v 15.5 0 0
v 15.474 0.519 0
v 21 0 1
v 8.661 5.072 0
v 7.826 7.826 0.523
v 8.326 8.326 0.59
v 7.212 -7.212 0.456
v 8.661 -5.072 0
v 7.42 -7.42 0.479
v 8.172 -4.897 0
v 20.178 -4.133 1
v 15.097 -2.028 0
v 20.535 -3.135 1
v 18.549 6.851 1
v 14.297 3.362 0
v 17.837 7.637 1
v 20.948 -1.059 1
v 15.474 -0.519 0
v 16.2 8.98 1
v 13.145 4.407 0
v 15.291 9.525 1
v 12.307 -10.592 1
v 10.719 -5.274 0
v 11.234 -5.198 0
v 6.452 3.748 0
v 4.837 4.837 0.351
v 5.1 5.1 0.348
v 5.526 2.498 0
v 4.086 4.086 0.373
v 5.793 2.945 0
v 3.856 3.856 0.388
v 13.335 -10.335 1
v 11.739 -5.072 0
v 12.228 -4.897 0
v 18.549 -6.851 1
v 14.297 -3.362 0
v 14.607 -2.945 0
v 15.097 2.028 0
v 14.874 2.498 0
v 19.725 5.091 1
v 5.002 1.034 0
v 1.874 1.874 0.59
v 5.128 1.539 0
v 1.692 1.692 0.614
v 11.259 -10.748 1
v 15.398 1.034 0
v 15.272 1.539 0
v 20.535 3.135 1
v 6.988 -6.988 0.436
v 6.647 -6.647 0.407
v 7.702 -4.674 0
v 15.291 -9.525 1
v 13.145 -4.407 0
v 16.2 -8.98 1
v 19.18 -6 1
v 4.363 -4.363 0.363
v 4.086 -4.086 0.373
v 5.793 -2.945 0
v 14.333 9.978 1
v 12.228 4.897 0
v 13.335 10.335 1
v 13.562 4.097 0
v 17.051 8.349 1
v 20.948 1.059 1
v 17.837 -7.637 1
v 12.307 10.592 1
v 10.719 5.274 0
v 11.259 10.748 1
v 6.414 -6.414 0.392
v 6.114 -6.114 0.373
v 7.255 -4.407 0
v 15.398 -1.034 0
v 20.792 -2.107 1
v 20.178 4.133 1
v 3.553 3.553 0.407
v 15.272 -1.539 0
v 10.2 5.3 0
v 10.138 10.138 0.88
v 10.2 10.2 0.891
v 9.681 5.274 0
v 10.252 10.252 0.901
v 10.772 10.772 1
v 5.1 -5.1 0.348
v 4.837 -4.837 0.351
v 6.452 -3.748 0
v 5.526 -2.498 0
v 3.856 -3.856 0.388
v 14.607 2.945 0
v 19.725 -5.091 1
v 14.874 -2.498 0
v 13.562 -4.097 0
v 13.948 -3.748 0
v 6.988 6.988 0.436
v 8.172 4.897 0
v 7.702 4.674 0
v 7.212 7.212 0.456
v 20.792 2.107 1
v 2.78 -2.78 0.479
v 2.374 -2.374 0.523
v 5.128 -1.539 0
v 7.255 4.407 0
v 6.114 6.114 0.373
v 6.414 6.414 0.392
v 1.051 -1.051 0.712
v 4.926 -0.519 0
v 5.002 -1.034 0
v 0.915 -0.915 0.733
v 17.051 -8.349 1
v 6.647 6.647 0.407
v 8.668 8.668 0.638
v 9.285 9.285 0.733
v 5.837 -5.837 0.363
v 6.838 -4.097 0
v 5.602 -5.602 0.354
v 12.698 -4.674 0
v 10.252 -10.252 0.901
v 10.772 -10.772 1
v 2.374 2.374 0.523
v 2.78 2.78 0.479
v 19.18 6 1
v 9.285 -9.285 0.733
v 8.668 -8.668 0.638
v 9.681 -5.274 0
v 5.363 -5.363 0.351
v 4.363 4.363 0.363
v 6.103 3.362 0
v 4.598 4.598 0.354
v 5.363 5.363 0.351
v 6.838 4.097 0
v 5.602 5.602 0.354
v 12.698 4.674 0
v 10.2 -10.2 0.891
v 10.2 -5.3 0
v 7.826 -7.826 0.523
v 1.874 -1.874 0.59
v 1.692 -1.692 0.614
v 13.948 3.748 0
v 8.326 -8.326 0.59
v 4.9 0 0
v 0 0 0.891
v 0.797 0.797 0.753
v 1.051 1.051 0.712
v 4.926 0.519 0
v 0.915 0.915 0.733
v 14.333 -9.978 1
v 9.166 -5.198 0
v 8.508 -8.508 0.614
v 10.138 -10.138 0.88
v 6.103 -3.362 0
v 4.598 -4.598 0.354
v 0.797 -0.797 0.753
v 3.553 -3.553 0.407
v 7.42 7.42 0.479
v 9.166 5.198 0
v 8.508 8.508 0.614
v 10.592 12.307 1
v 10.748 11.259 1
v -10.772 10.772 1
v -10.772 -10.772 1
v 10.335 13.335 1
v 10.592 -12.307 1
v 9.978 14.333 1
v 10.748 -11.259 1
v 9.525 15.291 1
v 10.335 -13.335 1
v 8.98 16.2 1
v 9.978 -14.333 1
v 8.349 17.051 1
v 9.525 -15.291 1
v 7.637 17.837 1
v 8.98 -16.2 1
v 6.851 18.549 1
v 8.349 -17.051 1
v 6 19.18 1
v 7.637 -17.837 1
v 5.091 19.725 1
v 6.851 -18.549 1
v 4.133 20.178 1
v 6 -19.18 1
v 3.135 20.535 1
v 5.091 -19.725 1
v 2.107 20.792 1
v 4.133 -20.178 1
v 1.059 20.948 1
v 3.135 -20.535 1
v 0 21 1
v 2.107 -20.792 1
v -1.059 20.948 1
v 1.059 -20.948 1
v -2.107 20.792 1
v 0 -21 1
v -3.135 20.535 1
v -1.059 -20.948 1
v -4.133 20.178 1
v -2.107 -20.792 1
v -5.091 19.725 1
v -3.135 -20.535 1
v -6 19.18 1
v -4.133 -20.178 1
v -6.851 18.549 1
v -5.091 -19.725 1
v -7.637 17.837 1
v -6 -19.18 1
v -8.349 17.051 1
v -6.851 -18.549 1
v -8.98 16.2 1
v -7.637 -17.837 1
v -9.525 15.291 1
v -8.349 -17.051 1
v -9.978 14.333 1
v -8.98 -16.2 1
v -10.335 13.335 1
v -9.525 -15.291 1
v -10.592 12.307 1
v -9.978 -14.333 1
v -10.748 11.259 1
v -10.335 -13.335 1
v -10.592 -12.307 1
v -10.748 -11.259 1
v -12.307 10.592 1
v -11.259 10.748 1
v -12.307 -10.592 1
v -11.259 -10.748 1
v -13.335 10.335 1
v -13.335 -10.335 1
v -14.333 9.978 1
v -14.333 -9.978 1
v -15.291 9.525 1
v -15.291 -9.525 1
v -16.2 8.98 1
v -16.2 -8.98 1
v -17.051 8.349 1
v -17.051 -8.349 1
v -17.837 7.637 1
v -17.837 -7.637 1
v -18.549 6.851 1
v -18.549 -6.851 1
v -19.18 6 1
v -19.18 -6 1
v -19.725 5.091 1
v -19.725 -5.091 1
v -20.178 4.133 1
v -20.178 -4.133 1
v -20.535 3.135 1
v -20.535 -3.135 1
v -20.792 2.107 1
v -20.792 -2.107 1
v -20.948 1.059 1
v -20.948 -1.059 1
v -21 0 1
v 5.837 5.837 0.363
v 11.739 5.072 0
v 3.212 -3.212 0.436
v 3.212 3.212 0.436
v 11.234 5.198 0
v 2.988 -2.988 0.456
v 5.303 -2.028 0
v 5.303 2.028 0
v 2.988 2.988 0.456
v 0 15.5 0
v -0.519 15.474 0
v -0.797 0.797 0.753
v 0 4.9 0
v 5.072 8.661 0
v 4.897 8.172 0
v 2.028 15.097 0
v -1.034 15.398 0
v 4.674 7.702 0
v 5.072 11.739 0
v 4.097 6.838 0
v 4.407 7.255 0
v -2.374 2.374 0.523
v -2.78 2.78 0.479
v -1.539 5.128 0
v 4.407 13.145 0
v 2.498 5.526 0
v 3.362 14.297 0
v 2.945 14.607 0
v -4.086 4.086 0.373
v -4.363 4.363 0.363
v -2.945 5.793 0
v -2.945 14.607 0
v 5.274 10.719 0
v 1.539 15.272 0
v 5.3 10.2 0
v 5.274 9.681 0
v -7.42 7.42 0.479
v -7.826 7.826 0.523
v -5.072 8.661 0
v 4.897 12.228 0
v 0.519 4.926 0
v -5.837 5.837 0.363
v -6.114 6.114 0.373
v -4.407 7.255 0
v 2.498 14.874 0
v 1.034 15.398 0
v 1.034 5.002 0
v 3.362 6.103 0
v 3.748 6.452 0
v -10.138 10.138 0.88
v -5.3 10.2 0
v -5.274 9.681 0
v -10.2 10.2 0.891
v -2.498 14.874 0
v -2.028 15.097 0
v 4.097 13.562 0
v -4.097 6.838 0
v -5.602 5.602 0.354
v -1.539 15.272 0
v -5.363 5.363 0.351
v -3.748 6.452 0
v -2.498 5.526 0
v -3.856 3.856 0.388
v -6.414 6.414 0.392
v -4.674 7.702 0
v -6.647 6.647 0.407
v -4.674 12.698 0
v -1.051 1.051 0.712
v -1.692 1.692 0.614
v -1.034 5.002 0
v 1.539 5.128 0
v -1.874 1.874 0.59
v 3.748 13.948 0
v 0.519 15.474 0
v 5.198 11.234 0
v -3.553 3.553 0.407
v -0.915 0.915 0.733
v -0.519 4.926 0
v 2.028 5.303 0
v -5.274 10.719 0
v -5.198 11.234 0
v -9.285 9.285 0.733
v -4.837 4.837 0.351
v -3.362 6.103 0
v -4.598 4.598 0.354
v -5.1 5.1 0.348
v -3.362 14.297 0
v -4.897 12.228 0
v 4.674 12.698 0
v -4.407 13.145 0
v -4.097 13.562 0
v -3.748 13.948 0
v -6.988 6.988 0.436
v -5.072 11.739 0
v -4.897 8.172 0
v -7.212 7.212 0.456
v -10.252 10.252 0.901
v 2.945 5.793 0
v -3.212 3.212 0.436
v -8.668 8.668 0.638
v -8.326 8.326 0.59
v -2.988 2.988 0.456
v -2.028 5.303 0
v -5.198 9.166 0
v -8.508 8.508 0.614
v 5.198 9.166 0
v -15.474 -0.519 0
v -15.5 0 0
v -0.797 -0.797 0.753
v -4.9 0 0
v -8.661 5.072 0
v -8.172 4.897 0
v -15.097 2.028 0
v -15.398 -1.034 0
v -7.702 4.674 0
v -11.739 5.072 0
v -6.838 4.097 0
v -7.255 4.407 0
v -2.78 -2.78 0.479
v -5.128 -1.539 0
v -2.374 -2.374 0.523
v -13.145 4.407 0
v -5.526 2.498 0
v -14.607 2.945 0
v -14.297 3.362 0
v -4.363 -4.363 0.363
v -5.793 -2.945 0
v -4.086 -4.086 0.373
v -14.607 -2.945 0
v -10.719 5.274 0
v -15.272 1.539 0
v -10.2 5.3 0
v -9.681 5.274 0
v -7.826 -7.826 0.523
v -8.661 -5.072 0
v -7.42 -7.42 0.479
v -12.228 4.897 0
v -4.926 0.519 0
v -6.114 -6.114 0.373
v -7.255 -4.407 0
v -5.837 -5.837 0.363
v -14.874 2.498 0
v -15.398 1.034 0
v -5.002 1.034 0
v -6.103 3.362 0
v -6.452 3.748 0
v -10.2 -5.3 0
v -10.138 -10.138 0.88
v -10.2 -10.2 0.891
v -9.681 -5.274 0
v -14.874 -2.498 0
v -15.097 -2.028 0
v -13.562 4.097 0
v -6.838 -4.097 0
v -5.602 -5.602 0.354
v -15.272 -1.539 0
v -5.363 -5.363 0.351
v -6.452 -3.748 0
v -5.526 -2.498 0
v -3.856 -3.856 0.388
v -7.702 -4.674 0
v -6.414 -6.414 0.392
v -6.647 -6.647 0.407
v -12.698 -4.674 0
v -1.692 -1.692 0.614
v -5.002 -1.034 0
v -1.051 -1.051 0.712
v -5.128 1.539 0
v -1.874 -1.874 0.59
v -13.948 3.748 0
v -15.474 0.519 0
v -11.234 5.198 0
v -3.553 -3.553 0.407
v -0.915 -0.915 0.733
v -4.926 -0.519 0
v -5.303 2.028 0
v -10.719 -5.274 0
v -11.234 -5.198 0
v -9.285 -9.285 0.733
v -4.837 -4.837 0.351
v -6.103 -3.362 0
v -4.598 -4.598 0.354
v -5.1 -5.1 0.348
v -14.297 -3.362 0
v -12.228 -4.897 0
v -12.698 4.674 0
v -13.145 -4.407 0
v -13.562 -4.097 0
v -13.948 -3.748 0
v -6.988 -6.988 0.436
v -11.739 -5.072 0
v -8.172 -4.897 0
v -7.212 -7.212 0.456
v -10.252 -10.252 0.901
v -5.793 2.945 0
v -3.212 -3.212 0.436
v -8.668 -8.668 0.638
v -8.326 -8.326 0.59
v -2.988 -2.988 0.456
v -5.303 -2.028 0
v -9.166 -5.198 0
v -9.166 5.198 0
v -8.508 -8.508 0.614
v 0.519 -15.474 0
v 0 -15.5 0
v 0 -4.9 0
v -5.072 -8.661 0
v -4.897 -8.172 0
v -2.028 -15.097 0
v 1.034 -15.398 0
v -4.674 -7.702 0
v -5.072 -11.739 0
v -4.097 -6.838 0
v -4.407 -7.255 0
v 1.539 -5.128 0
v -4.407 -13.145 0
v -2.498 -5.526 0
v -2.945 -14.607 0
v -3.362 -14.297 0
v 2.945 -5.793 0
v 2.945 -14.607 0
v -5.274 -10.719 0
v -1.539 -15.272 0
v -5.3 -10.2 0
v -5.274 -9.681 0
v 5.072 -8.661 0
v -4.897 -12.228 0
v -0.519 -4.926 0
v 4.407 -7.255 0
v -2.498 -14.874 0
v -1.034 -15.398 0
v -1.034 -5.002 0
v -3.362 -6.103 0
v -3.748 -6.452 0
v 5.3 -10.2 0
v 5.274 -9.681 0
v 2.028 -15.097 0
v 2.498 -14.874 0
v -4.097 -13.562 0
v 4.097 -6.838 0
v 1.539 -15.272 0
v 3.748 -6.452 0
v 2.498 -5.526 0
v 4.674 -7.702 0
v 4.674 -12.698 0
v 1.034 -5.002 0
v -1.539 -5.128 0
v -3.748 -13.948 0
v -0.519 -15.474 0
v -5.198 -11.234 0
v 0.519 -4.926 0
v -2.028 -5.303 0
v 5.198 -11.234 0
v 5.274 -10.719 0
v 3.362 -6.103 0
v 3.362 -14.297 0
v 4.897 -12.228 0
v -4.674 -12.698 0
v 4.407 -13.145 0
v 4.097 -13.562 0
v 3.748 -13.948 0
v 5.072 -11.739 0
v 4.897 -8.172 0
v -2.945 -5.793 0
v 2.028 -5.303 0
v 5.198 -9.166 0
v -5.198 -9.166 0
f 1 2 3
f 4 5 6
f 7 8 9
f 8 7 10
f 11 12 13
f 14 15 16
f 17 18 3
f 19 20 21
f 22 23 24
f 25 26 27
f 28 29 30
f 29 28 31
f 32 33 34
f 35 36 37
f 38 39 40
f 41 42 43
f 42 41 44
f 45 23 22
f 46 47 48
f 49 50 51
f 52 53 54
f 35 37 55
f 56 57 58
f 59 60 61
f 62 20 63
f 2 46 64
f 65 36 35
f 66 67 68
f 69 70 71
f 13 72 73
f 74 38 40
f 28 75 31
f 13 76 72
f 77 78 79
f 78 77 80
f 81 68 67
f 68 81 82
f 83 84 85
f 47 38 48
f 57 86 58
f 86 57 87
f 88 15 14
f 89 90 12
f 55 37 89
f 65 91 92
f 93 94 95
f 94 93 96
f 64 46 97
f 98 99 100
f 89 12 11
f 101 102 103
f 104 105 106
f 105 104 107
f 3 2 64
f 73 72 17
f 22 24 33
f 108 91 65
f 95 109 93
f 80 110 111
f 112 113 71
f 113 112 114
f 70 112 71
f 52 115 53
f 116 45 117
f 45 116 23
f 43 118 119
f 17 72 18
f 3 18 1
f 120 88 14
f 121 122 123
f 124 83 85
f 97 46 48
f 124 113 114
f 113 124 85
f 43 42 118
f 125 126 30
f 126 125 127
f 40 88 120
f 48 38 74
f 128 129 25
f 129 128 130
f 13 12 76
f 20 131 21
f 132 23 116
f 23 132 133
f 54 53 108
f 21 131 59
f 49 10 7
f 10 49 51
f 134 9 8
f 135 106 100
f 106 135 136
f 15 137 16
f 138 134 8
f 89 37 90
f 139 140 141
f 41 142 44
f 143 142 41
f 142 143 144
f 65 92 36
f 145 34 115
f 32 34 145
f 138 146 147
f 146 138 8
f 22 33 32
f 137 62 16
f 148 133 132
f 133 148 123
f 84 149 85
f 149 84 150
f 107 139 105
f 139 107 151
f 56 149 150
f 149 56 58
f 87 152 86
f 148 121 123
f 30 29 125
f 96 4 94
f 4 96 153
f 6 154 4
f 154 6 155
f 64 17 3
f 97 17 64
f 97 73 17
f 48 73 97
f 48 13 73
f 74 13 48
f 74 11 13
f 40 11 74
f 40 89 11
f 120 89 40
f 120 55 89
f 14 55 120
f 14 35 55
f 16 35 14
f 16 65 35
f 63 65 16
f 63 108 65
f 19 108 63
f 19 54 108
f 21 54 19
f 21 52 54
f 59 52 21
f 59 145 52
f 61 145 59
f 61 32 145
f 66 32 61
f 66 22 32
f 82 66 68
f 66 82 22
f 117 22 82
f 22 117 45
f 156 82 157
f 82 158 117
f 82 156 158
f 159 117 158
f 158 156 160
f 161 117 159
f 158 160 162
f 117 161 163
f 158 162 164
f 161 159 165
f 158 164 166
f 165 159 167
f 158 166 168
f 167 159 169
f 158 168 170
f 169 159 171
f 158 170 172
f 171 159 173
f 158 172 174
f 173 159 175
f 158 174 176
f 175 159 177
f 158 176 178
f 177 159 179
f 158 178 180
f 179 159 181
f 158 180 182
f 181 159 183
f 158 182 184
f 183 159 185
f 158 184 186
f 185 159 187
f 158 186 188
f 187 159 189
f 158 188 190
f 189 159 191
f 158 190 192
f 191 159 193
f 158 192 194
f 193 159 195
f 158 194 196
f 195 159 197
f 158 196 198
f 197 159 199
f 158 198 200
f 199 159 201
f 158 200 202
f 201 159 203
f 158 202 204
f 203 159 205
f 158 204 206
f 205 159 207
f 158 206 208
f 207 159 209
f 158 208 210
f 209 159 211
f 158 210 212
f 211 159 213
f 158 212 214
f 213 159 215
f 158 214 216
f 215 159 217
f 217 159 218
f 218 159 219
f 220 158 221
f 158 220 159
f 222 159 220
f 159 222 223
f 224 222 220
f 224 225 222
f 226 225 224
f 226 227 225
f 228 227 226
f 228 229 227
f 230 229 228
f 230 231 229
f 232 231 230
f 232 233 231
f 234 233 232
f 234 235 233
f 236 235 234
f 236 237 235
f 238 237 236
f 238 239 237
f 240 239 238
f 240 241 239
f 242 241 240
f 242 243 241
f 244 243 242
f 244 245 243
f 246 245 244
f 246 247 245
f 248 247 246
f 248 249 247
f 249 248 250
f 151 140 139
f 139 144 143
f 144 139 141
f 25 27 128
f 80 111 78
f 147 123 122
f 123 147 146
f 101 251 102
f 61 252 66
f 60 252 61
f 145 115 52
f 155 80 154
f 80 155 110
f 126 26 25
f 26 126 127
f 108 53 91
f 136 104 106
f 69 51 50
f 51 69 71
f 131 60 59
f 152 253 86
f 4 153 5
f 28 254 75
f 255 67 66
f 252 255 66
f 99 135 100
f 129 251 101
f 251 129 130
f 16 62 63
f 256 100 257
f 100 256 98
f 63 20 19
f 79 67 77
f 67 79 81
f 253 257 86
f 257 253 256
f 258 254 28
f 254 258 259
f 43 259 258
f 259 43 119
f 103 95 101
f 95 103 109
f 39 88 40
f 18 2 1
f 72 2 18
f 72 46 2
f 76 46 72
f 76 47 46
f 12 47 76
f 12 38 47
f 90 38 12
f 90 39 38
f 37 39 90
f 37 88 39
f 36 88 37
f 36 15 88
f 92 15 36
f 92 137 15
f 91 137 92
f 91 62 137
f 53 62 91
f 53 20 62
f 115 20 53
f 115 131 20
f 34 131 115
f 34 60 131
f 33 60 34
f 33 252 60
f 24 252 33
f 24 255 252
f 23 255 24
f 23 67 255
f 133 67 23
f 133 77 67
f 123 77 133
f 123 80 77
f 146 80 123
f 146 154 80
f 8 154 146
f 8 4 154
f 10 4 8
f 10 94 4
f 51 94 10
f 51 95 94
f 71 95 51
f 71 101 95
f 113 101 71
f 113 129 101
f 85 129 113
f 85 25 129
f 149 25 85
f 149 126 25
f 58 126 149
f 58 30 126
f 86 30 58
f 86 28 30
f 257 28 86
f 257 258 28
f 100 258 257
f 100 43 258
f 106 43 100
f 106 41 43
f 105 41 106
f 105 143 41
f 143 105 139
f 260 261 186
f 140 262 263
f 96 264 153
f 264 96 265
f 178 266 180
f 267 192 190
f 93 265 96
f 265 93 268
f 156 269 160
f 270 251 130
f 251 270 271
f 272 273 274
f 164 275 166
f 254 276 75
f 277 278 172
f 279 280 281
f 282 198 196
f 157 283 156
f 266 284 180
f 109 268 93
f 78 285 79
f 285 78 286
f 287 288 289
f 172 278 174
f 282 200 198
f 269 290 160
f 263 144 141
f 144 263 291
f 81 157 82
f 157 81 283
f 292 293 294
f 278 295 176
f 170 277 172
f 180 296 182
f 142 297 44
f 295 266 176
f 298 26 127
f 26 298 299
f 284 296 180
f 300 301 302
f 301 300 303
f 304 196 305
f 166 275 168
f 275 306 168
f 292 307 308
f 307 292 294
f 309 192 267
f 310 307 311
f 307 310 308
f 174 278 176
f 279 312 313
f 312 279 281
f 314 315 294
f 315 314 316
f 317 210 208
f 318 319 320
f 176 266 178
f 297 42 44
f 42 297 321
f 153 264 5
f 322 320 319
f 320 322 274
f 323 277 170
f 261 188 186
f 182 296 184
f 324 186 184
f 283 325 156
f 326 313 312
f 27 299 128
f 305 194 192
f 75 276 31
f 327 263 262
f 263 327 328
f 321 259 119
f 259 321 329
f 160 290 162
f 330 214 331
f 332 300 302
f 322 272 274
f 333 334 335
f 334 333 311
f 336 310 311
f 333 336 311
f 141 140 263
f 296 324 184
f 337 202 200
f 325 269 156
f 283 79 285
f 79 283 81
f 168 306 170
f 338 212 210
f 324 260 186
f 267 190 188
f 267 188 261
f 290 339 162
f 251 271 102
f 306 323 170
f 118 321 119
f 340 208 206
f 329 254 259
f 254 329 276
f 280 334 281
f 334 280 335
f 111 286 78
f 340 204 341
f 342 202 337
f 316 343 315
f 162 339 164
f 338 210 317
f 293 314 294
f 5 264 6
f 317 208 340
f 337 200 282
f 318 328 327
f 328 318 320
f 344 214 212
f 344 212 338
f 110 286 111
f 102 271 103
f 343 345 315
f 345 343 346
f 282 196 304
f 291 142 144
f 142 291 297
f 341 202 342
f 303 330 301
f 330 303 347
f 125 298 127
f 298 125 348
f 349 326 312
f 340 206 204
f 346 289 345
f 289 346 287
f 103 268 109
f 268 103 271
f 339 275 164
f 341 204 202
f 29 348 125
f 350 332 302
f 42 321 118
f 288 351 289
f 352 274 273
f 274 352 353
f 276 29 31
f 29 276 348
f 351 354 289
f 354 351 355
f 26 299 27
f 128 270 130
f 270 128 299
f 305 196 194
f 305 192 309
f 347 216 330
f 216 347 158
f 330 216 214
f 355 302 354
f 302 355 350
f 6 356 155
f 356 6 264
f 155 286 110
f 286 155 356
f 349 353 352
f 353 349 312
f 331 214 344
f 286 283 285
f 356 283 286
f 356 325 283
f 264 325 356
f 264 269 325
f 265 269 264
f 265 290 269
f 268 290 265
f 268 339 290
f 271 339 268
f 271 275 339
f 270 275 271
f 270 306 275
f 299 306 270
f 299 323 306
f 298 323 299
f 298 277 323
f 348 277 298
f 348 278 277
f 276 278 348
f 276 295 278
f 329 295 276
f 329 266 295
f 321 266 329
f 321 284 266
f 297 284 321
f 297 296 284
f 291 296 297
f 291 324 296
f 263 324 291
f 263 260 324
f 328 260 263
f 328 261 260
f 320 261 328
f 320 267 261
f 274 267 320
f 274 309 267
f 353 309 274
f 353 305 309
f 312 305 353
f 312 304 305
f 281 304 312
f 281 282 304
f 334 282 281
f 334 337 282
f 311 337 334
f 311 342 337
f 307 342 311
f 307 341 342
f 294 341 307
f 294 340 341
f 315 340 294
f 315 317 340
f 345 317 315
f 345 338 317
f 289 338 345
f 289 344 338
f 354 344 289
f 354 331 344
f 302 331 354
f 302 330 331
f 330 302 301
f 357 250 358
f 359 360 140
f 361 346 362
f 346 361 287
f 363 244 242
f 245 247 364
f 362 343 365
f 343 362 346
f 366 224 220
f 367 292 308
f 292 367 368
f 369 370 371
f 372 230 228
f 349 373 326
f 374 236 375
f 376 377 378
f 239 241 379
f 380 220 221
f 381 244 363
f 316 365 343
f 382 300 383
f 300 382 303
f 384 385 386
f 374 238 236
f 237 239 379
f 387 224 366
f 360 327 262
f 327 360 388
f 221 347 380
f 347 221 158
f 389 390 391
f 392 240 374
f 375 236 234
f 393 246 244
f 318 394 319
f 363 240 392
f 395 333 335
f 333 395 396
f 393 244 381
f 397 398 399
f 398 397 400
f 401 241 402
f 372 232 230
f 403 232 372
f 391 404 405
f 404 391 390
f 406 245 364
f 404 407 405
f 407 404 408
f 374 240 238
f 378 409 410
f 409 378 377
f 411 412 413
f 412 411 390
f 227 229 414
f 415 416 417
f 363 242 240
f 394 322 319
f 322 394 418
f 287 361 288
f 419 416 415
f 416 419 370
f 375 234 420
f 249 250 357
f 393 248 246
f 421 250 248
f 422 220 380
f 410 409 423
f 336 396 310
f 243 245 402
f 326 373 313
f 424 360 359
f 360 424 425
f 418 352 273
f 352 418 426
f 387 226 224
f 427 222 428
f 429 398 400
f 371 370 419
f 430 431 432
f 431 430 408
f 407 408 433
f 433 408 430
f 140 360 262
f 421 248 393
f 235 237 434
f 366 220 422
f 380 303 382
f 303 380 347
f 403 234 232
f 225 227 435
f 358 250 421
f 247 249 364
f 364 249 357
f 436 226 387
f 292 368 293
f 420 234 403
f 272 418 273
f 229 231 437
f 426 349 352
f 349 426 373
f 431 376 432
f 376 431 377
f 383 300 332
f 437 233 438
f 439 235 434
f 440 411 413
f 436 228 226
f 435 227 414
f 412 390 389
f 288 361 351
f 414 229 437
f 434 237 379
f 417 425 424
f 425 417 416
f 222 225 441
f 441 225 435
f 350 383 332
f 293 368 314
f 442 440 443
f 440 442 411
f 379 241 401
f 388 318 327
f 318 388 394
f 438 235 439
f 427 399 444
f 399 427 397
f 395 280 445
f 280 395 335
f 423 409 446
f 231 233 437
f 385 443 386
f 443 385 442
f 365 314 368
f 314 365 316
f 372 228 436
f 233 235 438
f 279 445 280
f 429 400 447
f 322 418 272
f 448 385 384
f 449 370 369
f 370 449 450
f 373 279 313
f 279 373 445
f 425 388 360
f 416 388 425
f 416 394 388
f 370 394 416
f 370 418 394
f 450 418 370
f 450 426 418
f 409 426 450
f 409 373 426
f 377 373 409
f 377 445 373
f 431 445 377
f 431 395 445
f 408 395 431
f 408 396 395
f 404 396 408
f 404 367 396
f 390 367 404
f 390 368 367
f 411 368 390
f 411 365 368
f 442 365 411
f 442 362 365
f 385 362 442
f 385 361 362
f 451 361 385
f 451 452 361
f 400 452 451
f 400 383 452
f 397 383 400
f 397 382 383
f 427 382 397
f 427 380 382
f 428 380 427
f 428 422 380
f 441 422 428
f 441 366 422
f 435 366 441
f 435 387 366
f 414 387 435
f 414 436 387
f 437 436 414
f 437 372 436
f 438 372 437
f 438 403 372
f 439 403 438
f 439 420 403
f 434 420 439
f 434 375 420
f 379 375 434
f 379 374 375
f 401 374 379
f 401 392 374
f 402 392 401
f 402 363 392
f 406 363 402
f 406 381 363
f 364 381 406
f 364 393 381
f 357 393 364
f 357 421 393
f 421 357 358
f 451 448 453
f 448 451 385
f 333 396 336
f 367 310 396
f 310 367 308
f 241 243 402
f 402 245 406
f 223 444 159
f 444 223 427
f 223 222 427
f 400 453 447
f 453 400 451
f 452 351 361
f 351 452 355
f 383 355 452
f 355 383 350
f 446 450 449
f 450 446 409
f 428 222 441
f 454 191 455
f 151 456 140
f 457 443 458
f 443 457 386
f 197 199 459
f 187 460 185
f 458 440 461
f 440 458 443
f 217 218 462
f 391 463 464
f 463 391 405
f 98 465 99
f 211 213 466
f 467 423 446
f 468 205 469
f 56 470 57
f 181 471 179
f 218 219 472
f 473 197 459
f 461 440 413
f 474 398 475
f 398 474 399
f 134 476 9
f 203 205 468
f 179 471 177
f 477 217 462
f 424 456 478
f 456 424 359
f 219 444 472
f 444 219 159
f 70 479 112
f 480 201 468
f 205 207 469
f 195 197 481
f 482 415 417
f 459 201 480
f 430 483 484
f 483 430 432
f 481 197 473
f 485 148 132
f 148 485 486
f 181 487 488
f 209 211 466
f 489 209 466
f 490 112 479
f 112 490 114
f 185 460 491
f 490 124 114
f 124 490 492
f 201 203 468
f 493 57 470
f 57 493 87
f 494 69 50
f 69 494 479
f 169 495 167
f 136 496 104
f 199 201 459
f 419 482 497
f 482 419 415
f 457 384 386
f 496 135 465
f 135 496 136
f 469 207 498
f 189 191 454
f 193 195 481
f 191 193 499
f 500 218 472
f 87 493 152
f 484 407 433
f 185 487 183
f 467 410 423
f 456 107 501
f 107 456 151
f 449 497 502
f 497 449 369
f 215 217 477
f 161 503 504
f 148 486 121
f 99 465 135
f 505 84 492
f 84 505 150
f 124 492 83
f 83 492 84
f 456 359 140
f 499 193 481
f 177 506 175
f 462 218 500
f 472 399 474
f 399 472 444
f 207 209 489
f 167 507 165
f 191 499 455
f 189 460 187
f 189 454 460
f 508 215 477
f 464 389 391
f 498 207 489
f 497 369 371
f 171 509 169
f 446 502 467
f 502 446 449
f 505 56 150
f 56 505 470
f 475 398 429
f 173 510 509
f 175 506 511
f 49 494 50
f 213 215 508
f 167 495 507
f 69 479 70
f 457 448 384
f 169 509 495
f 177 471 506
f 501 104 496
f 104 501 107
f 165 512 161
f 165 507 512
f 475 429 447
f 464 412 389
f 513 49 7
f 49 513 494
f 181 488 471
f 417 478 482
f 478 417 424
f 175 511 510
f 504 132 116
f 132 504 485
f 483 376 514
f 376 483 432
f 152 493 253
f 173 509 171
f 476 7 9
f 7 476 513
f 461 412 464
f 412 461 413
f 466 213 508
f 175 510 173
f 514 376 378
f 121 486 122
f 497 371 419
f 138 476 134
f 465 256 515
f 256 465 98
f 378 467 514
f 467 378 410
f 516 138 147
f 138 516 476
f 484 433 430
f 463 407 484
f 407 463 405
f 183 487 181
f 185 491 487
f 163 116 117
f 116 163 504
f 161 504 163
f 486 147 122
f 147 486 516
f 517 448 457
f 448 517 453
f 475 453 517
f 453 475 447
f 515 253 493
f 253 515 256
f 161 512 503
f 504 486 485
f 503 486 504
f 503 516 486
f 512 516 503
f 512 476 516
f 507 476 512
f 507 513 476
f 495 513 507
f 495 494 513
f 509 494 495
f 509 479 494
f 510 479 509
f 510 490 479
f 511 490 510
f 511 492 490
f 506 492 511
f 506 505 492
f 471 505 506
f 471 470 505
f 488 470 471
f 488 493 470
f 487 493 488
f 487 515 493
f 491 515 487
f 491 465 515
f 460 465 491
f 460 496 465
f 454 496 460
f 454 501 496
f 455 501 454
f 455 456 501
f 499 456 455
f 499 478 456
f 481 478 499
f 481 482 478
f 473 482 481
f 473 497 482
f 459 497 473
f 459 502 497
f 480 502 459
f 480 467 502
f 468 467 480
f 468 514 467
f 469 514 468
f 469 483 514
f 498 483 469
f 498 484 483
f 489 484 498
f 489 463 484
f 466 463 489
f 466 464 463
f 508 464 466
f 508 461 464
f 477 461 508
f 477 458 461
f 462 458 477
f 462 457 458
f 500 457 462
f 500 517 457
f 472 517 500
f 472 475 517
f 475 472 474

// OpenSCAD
module radial() {
    for (i = [0 : 3]) {
        rotate([0, 0, i * 90])
        translate([10.2, 0, 0])
        cylinder(h = 1, r1 = 5.3, r2 = 10.8, $fn = 64);
    }
}

radial();
